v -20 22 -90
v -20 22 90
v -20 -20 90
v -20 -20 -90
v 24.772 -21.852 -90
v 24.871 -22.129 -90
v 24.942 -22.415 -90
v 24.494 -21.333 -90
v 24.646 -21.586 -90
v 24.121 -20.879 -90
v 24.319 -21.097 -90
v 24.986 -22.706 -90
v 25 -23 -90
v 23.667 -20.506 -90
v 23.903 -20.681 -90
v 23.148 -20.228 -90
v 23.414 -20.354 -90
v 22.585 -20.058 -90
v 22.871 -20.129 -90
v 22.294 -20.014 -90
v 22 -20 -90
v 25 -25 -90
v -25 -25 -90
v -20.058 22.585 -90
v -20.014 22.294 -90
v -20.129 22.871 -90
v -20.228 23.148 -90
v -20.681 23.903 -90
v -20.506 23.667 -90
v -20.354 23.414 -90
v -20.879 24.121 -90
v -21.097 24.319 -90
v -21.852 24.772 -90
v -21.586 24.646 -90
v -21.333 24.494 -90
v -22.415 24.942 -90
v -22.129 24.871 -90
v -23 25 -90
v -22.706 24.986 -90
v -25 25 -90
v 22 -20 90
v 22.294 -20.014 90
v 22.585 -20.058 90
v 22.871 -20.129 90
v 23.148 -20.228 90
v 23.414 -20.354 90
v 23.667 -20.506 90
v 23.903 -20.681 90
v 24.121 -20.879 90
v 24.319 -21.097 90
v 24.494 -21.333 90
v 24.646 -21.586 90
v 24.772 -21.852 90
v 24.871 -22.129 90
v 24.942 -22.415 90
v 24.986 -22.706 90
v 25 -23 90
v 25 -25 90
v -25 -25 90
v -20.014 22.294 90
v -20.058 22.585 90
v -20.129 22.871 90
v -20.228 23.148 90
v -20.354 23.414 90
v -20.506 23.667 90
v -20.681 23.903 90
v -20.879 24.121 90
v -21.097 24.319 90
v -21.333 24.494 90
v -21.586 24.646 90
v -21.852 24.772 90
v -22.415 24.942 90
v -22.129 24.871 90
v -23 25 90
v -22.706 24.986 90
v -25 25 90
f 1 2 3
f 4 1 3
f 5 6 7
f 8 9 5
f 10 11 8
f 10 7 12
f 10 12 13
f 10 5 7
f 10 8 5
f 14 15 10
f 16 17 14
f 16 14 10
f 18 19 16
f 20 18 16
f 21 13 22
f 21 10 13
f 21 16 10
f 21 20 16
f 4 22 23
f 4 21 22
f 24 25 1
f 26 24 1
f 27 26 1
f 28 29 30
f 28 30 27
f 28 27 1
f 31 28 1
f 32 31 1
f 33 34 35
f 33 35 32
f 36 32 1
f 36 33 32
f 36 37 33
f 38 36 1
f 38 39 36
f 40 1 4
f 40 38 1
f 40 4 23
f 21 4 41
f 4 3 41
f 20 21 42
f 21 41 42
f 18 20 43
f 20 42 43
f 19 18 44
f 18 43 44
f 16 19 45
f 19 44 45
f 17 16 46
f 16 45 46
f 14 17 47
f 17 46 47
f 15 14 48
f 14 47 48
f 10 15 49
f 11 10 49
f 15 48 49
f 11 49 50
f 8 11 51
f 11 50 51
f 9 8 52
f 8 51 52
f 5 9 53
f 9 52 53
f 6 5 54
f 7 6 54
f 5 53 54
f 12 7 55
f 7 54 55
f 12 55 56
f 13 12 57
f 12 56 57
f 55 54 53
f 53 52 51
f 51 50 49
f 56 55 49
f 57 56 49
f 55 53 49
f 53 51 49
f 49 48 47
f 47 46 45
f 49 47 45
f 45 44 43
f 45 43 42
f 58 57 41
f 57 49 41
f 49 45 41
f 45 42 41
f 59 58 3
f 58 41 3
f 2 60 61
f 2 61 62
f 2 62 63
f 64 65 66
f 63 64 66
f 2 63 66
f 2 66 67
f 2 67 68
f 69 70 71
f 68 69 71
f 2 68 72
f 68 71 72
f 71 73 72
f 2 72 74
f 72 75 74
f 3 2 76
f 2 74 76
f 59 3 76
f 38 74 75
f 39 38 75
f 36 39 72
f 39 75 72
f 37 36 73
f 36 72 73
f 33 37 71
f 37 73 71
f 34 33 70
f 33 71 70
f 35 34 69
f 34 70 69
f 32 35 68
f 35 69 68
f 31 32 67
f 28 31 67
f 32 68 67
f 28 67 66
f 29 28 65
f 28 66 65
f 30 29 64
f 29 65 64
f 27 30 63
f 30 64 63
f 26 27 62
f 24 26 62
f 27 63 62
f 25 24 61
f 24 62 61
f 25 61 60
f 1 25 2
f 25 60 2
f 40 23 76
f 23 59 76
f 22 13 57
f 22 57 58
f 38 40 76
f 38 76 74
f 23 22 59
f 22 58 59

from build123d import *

# Parameters (mm, degrees)
BOSS_EXTRUDE1_DEPTH = 90


with BuildPart() as part:
    # Sketch1 → Boss-Extrude1 (new, symmetric)
    with BuildSketch(Plane.XY):
        with BuildLine():
            Line((-20, 22), (-20, -20))
            Line((-20, -20), (22, -20))
            ThreePointArc((22, -20), (24.121320344, -20.878679656), (25, -23))
            Line((25, -23), (25, -25))
            Line((25, -25), (-25, -25))
            Line((-25, -25), (-25, 25))
            Line((-25, 25), (-23, 25))
            ThreePointArc((-23, 25), (-20.878679656, 24.121320344), (-20, 22))
        make_face()
    extrude(amount=BOSS_EXTRUDE1_DEPTH, both=True)


solid = part.part
